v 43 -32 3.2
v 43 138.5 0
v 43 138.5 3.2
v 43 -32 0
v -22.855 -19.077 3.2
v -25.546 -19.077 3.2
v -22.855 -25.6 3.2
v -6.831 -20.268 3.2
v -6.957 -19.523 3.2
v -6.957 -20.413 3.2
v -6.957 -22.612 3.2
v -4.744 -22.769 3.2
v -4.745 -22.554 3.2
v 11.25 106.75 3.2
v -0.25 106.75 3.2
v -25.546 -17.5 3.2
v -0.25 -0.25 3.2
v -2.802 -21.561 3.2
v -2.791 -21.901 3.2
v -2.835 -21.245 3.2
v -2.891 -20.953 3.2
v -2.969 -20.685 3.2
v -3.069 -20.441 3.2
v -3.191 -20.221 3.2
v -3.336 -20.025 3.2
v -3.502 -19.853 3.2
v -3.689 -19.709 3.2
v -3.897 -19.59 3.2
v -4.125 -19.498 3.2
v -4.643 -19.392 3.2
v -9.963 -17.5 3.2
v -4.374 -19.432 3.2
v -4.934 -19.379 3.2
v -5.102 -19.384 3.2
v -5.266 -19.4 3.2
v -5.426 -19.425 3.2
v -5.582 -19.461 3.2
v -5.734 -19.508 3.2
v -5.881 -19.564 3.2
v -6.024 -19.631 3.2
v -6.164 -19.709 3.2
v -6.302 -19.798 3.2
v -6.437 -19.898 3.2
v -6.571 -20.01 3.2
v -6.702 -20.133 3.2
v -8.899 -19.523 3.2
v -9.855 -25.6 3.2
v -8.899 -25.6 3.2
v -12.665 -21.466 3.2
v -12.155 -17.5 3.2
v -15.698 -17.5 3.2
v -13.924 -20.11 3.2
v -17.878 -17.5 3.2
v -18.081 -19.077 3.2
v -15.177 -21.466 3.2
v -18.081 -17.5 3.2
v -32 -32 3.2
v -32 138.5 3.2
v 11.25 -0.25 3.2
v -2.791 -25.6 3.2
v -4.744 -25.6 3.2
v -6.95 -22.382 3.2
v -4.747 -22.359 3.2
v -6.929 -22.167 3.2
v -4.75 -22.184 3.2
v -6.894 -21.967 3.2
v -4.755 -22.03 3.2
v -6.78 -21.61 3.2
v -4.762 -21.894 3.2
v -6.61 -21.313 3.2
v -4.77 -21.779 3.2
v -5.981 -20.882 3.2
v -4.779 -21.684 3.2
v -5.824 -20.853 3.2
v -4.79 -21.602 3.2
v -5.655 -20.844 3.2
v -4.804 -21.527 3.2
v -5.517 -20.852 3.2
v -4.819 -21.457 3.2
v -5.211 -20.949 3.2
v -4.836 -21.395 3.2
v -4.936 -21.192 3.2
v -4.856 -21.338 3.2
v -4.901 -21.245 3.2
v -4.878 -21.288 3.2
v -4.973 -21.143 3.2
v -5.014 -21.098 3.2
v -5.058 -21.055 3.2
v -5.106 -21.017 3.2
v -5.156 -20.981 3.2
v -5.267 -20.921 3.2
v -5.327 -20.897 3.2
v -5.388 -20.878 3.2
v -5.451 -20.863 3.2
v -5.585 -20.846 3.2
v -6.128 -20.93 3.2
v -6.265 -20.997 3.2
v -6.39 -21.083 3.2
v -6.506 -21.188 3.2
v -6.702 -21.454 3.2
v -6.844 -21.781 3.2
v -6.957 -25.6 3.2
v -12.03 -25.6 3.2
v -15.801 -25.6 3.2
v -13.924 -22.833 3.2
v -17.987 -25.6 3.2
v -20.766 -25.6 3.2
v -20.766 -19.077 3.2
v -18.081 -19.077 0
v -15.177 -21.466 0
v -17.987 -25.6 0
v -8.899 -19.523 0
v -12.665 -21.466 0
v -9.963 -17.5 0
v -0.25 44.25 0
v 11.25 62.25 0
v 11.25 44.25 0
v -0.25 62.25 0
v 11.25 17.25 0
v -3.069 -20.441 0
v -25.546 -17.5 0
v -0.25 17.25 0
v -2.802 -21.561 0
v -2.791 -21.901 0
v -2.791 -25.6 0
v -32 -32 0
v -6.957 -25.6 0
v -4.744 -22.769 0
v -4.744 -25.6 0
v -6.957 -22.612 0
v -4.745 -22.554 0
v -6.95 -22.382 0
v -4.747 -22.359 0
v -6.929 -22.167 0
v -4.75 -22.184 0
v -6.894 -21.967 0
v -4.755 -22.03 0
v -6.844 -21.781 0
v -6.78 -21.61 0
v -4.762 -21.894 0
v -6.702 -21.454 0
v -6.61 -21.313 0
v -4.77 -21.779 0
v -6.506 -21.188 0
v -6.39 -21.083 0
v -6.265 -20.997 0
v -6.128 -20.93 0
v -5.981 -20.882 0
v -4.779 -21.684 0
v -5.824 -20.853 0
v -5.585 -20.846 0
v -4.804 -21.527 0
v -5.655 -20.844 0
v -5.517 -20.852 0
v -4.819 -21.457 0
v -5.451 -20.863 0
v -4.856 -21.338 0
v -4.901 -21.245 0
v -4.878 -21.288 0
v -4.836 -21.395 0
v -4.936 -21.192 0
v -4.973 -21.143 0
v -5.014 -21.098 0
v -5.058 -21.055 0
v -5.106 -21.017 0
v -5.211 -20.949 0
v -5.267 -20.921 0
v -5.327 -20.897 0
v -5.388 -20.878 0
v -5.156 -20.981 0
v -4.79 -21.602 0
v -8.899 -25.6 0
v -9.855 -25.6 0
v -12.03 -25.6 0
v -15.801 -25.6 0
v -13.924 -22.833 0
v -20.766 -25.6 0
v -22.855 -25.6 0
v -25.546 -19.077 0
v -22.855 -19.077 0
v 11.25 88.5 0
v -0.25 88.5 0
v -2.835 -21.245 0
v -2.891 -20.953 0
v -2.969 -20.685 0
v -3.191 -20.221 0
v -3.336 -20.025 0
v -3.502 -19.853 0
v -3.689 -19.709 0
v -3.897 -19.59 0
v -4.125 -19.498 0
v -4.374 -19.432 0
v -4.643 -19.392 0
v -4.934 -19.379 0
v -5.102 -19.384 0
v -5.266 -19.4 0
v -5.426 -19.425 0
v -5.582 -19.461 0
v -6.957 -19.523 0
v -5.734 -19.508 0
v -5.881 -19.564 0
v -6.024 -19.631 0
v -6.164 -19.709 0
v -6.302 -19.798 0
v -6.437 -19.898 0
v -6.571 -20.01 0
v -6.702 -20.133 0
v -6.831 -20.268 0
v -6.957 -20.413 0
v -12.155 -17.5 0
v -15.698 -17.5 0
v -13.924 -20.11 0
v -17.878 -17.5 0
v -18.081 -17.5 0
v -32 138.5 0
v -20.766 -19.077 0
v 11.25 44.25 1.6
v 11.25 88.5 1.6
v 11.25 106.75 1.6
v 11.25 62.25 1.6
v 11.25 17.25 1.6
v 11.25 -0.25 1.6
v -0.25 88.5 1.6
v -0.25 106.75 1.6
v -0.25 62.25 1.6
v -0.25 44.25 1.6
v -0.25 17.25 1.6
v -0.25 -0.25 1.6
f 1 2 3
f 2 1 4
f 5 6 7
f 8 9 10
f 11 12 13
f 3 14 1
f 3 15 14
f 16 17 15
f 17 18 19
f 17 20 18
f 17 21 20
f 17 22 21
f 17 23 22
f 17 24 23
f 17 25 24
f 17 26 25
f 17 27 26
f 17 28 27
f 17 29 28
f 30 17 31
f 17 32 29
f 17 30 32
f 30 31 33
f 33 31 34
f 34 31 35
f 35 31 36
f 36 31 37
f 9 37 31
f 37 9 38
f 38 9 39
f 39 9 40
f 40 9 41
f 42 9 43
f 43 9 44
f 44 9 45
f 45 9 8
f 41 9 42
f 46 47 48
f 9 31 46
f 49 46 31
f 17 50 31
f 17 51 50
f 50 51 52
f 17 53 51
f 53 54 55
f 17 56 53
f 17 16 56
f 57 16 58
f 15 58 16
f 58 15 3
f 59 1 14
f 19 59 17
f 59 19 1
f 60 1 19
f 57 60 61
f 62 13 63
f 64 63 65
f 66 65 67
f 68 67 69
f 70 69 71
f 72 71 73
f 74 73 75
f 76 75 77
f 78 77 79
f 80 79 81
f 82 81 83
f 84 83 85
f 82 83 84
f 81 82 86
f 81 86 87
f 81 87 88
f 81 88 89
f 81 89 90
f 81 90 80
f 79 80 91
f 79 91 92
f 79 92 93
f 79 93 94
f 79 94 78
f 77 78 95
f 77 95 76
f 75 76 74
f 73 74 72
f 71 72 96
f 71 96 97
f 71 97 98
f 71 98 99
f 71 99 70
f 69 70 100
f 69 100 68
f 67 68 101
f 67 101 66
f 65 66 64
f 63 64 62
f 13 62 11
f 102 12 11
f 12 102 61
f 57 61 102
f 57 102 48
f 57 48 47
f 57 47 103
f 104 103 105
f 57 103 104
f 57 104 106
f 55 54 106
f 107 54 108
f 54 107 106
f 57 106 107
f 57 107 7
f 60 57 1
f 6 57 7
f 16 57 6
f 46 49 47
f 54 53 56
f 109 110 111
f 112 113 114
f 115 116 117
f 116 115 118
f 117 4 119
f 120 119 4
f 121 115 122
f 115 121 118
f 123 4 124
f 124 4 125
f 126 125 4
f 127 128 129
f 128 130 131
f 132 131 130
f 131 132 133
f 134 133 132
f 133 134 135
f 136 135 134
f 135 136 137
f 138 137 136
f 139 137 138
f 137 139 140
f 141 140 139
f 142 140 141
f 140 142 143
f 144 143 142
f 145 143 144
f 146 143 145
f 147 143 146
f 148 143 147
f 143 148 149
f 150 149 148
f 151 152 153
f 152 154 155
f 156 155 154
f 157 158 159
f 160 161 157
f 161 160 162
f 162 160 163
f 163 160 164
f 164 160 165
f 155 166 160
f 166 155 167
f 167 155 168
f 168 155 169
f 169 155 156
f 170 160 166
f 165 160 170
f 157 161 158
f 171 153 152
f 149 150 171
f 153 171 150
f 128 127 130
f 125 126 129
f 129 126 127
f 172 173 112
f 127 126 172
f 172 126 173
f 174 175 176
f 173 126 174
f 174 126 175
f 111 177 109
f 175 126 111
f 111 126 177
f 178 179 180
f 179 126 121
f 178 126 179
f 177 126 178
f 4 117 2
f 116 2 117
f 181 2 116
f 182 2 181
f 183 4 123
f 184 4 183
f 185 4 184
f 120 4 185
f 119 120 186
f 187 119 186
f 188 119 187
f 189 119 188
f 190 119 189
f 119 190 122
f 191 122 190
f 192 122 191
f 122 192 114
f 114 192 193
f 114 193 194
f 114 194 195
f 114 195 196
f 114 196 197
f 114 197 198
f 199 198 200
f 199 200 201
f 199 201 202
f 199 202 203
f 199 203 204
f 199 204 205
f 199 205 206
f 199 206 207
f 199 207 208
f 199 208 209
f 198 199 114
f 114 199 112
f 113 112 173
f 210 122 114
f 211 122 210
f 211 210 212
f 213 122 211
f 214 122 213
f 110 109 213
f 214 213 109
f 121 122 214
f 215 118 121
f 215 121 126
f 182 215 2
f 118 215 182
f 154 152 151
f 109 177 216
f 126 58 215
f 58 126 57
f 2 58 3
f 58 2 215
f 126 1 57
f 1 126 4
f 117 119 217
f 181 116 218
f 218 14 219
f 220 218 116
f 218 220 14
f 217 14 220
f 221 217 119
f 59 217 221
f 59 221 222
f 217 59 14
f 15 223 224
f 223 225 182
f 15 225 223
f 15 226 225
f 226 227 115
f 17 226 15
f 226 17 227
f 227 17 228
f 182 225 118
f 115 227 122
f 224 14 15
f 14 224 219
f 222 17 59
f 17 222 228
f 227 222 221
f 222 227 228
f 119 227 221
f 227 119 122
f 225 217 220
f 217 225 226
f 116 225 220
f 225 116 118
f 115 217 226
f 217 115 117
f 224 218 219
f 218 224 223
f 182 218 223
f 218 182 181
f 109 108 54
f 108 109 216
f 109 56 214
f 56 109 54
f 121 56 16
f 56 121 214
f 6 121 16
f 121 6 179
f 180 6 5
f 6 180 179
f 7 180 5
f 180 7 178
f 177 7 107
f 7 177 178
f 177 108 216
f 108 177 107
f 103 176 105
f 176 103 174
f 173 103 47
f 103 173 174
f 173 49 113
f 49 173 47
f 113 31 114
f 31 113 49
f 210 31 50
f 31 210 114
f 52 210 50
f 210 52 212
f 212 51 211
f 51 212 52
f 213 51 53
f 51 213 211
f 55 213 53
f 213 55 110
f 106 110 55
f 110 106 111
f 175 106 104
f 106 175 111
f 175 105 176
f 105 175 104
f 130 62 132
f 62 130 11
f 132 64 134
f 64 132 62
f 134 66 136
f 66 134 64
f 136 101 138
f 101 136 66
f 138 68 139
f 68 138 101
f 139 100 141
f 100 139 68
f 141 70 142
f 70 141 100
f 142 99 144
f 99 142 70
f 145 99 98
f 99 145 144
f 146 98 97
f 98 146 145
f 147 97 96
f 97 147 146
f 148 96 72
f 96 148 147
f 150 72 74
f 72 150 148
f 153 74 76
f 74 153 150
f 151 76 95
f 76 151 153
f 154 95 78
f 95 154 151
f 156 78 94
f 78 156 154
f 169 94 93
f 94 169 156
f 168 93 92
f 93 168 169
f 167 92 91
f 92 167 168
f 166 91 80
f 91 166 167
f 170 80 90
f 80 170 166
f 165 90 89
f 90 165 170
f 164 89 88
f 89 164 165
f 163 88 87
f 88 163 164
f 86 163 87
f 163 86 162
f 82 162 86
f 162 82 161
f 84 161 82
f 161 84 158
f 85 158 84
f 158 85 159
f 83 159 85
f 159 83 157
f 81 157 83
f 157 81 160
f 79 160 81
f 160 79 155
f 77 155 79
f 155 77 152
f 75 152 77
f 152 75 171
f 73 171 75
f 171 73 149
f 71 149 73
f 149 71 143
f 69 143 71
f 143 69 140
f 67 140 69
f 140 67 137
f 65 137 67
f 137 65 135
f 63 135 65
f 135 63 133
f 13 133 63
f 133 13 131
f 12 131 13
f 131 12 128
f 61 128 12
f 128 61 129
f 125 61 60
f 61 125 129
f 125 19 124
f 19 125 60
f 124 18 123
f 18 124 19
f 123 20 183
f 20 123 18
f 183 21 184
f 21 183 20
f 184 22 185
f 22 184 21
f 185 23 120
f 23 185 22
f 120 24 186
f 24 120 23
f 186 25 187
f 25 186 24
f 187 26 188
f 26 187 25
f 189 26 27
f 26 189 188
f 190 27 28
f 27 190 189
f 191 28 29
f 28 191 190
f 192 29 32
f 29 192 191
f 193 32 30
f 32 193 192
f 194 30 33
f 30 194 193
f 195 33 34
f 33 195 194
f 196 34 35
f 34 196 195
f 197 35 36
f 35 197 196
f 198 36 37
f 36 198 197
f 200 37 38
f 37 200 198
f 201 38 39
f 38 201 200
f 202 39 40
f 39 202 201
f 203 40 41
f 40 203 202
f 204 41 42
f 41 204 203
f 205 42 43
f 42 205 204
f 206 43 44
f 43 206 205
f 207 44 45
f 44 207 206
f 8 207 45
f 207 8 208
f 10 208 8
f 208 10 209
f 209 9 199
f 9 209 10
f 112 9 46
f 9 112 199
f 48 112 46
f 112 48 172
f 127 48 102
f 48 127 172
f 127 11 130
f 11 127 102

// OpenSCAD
$fn = 50;

// TXo Bottom

tolerance = .5;

pcbX = 11;
pcbY = 106.5;
pcbZ = 1.6;

frame = 32;

barOneStart = 0;
barOneEnd = 18;

barTwoStart = pcbY / 2 - 9;
barTwoEnd = barTwoStart + 18;

barThreeStart = pcbY - 18;
barThreeEnd = 107.01 + (tolerance / 2);

corner = 2.5;

difference(){

    union(){
        difference() {
            translate([-frame, - frame, 0])
                cube([pcbX + 2 * frame, pcbY + 2 * frame, 2 * pcbZ]);
            translate([-tolerance/2, -tolerance/2, 0])
                cube([pcbX + tolerance, pcbY + tolerance, 2 * pcbZ]);
        }

        translate([-tolerance/2, barOneStart-(tolerance/2), 0])
            cube([pcbX + tolerance, barOneEnd - barOneStart -tolerance, pcbZ]);
            
        translate([-tolerance/2, barTwoStart, 0])
            cube([pcbX + tolerance, barTwoEnd - barTwoStart, pcbZ]);
        
        translate([-tolerance/2, barThreeStart, 0])
            cube([pcbX + tolerance, barThreeEnd - barThreeStart, pcbZ]);

    }

     translate([-frame * .8, -frame * .8]) {
       linear_extrude(height = 2 * pcbZ)
        text("TXn", font = "Core Humanist Sans:style=Bold", size = 8);
     }
 
 }

/*

translate([-13,-frame * .74,0])
    cube([10, pcbZ * .5, pcbZ / 3]);


translate([-4,-frame * .655,0])
    cube([8, pcbZ * .4, pcbZ / 3]);
 
translate([-4,-frame * .755,0])
    cube([7, pcbZ * .4, pcbZ / 3]);

translate([3,-frame * .74,0])
    cube([7, pcbZ * .4, pcbZ / 3]);
 
translate([18,-frame * .74,0])
    cube([7, pcbZ * .4, pcbZ / 3]);
 
 */               
